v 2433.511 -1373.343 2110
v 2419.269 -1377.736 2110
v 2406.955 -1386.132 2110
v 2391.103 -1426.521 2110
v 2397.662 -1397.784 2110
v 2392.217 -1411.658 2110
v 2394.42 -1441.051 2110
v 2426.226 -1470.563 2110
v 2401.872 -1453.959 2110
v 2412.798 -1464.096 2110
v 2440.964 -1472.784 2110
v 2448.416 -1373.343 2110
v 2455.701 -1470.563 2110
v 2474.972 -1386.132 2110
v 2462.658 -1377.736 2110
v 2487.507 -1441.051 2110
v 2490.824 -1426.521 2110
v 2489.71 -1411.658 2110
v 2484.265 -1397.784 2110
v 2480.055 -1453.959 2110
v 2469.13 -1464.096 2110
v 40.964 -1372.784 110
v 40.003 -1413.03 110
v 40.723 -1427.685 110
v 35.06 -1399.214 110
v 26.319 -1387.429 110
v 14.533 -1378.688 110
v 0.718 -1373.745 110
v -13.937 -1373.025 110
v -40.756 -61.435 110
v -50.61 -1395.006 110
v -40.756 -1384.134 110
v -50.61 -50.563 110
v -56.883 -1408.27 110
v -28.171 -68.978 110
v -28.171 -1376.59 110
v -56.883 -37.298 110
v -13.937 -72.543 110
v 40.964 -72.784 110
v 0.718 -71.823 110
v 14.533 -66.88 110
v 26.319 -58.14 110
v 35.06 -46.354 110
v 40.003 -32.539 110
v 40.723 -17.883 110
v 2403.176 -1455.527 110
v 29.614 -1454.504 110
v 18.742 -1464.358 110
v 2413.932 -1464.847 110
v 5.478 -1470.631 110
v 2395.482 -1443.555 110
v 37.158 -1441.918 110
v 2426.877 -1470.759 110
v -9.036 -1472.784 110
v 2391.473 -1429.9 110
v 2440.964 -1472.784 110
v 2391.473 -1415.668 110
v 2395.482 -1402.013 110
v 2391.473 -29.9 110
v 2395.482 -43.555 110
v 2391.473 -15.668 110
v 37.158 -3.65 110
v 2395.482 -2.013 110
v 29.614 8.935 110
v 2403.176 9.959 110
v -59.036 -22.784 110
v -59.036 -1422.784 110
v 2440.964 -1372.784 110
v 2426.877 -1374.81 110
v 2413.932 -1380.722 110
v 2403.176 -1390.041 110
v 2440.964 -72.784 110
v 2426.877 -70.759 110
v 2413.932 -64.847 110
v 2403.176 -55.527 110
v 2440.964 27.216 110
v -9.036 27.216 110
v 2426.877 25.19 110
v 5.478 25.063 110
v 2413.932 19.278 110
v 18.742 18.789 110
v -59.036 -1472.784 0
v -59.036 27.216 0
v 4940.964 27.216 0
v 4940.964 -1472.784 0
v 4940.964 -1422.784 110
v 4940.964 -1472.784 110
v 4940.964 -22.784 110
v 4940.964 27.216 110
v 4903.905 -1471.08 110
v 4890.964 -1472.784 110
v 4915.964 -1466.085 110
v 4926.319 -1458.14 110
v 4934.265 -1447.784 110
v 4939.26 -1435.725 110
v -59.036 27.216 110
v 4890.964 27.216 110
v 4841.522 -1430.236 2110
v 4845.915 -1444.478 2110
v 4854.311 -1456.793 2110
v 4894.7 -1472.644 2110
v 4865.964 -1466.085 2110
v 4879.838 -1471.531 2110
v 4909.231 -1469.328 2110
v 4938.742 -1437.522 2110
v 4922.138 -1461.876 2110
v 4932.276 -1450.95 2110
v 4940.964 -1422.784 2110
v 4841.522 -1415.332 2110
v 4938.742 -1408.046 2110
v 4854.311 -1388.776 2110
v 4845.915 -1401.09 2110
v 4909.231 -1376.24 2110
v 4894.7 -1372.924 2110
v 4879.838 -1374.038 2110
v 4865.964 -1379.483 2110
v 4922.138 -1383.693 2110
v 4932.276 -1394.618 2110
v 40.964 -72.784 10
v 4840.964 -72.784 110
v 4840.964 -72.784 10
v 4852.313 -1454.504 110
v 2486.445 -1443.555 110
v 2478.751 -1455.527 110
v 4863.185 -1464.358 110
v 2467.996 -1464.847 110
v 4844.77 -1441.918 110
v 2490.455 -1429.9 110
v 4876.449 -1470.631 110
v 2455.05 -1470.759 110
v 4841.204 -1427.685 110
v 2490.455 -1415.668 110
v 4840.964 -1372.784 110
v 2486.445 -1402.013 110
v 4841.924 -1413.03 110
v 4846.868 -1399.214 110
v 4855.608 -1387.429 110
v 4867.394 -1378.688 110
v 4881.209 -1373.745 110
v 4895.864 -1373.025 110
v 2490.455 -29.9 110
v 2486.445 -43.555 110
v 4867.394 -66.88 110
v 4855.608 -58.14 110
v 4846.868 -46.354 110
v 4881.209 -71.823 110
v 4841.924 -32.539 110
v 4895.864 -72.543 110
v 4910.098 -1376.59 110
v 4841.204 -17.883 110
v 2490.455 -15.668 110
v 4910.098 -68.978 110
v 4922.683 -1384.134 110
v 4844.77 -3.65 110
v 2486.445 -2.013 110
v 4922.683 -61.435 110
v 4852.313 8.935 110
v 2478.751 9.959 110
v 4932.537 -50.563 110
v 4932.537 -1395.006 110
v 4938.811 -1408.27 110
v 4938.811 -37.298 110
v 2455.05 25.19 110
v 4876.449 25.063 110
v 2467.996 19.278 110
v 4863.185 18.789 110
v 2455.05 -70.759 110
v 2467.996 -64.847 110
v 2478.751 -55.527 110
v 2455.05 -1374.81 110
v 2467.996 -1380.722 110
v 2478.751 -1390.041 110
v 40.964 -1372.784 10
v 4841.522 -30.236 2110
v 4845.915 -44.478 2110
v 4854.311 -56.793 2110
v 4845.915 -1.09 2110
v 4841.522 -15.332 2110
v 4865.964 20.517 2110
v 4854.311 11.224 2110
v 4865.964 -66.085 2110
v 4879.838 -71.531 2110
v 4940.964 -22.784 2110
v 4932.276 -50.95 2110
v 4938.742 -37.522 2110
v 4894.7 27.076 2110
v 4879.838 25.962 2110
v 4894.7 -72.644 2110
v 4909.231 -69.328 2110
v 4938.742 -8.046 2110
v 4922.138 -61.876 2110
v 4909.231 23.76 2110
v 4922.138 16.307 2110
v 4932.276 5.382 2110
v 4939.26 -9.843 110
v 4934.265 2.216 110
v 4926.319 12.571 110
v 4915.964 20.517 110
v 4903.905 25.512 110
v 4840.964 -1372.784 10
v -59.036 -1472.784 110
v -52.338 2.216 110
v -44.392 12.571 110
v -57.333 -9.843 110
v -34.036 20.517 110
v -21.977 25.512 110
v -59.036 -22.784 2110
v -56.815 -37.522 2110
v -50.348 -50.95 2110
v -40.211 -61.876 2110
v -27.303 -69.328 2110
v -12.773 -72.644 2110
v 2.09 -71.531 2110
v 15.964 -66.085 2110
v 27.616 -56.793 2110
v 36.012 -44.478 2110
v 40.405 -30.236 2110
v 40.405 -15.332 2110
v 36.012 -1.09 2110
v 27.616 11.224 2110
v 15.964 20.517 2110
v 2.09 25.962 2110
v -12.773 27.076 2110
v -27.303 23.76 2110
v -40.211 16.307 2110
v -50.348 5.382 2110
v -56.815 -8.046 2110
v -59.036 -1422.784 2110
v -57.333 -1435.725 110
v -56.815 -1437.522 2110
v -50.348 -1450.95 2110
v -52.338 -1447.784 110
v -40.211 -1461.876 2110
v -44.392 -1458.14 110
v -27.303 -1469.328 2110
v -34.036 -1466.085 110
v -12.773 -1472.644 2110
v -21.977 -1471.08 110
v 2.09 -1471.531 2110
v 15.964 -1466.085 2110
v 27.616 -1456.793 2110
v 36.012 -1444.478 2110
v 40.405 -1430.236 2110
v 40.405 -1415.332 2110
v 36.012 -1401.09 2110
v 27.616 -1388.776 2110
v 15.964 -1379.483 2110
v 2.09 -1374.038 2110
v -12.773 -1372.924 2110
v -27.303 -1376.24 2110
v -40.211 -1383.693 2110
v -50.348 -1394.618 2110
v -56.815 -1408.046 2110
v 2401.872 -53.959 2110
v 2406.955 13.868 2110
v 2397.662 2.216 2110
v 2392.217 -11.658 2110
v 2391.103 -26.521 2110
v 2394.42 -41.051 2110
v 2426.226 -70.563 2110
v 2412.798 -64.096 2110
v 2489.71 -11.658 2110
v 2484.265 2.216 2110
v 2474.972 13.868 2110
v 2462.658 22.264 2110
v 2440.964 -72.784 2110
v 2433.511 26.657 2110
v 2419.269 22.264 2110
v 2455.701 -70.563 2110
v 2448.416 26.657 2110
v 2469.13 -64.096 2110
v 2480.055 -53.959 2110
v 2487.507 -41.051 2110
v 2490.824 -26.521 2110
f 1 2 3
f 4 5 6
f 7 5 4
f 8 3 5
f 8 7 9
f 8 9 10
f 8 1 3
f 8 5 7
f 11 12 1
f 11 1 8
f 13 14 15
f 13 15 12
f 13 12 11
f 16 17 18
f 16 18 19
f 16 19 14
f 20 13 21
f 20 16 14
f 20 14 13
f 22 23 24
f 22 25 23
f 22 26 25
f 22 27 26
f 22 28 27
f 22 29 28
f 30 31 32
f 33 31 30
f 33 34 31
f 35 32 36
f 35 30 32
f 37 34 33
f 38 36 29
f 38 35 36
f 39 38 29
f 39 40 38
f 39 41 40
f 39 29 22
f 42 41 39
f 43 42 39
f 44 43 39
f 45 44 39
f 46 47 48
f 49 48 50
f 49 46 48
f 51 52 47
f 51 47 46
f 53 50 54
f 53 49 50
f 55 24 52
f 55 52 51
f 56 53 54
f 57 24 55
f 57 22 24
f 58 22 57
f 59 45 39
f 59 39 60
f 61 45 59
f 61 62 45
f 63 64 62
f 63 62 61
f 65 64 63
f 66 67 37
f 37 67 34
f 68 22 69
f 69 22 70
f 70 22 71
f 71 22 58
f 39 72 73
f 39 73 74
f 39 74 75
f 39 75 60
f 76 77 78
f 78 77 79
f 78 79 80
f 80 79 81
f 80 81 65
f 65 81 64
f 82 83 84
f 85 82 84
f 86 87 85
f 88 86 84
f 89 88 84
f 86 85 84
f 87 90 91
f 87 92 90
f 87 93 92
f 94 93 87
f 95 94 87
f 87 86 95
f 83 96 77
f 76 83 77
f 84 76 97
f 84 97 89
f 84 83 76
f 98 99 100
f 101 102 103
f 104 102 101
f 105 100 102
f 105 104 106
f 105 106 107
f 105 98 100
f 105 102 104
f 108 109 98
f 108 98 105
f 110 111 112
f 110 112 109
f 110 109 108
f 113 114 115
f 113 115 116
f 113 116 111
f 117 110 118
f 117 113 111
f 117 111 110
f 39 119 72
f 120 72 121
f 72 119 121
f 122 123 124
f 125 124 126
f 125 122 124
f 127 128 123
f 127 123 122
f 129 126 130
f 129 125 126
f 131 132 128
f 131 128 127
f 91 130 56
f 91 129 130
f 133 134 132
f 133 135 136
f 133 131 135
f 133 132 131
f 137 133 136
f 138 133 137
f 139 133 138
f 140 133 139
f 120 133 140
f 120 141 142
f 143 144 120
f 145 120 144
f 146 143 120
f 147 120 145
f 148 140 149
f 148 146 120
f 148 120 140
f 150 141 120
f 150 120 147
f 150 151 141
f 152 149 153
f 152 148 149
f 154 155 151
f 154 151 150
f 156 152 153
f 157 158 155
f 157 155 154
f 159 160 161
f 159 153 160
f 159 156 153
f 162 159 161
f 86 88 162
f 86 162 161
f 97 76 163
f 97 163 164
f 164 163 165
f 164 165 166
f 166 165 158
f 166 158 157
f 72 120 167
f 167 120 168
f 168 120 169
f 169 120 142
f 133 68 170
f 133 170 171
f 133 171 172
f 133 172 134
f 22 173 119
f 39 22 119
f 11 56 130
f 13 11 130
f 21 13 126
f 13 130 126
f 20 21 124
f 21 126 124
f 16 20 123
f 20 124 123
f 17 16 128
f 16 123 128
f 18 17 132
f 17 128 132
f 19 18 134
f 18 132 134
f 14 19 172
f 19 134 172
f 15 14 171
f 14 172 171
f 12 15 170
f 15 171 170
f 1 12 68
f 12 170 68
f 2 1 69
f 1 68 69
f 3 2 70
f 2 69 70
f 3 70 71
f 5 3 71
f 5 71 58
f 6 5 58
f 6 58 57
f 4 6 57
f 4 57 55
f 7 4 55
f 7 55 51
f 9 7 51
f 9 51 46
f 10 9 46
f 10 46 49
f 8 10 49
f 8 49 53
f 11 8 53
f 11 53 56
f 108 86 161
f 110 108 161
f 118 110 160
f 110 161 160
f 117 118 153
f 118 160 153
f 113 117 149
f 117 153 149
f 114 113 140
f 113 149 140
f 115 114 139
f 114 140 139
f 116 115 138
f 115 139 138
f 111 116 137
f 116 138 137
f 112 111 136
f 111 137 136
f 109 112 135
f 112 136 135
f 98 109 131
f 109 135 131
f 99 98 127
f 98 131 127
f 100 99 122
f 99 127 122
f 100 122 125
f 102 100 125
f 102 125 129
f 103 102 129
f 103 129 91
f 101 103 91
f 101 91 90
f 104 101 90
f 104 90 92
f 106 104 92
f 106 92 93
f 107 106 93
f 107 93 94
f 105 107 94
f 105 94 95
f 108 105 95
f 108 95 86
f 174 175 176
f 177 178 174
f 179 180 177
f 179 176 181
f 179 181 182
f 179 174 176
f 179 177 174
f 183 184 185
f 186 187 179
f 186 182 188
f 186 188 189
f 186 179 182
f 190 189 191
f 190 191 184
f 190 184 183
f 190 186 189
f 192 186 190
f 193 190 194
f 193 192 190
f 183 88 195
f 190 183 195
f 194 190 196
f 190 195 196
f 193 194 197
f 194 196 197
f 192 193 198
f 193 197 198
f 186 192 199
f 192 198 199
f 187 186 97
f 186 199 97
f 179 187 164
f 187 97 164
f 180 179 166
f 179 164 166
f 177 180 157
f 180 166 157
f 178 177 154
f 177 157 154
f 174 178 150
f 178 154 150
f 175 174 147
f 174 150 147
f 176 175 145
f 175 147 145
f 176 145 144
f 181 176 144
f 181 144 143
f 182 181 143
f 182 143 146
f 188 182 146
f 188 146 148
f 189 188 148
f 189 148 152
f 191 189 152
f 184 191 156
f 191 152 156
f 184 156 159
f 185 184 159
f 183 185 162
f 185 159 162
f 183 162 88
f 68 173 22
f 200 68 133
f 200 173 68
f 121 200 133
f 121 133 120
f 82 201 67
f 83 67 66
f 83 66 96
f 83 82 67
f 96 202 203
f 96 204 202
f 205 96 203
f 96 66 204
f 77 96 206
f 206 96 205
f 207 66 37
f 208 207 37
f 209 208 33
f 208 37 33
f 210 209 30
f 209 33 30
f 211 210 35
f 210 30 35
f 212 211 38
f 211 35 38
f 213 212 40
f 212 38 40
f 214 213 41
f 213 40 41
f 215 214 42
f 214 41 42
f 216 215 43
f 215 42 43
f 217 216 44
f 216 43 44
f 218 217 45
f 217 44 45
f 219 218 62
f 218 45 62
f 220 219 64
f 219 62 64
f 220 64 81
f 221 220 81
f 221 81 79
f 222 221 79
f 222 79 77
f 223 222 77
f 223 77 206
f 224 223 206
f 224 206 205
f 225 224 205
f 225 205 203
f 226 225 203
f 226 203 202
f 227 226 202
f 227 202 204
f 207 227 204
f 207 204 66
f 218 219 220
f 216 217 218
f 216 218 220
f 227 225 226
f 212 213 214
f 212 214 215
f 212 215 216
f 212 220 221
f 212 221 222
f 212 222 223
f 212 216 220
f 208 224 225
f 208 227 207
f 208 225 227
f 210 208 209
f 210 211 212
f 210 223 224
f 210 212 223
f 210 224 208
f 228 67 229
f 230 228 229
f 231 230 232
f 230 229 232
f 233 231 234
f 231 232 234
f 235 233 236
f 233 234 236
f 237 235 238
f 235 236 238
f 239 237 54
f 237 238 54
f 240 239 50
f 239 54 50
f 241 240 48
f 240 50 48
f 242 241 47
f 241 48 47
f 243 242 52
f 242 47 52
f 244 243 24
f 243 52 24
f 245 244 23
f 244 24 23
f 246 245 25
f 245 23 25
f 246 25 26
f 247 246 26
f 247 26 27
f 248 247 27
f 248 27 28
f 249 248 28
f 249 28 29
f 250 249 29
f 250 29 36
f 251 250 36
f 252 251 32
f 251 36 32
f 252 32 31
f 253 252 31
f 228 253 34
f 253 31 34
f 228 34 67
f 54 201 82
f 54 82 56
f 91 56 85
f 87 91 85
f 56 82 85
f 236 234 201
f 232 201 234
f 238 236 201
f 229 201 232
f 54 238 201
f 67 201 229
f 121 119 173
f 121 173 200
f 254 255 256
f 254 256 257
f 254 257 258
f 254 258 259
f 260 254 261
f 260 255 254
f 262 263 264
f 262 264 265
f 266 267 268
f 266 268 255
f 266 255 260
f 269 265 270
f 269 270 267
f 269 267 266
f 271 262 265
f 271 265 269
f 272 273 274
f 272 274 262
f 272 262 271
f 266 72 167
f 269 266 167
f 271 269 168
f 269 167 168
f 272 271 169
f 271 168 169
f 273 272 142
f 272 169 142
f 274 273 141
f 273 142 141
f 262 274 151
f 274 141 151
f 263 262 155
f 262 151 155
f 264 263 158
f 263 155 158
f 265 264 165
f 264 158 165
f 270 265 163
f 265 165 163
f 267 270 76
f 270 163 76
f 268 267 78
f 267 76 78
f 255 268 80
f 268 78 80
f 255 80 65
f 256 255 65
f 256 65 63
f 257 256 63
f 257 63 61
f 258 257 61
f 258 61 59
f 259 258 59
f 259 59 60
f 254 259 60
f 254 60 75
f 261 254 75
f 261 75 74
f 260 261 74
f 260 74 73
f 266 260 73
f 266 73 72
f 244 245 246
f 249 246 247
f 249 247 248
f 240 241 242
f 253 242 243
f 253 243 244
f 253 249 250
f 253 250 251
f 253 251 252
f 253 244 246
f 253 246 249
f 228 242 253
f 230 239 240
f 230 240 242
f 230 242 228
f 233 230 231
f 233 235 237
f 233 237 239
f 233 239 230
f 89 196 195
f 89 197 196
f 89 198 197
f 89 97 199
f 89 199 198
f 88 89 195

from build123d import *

# Parameters (mm, degrees)
SKETCH_1_W      = 5000
SKETCH_1_H      = 1500
EXTRUDE_1_DEPTH = 10
SKETCH_2_W      = 5000
SKETCH_2_H      = 1500
SKETCH_2_W_2    = 4800
SKETCH_2_H_2    = 1300
EXTRUDE_2_DEPTH = 100
SKETCH_3_R      = 50
EXTRUDE_3_DEPTH = 2000
SKETCH_4_R      = 50
EXTRUDE_4_DEPTH = 2000


with BuildPart() as part:
    # 草图1 → 凸台-拉伸1 (new body)
    with BuildSketch(Plane.XY):
        with Locations((2440.963587986, -722.784179357)):
            Rectangle(SKETCH_1_W, SKETCH_1_H)
    extrude(amount=EXTRUDE_1_DEPTH)

    # 草图2 → 凸台-拉伸2 (add)
    with BuildSketch(Plane.XY.offset(10)):
        with Locations((2440.963587986, -722.784179357)):
            Rectangle(SKETCH_2_W, SKETCH_2_H)
        with Locations((2440.963587986, -722.784179357)):
            Rectangle(SKETCH_2_W_2, SKETCH_2_H_2, mode=Mode.SUBTRACT)
    extrude(amount=EXTRUDE_2_DEPTH)

    # 草图3 → 凸台-拉伸3 (add)
    with BuildSketch(Plane.XY.offset(110)):
        with Locations(Location((-9.036412014, -22.784179357, 0), (0, 0, 180))):
            Circle(SKETCH_3_R)
        with Locations(Location((-9.036412014, -1422.784179357, 0), (0, 0, 180))):
            Circle(SKETCH_3_R)
        with Locations((4890.963587986, -1422.784179357)):
            Circle(SKETCH_3_R)
        with Locations((4890.963587986, -22.784179357)):
            Circle(SKETCH_3_R)
    extrude(amount=EXTRUDE_3_DEPTH)

    # 草图4 → 凸台-拉伸4 (add)
    with BuildSketch(Plane.XY.offset(110)):
        with Locations(Location((2440.963587986, -22.784179357, 0), (0, 0, 270))):
            Circle(SKETCH_4_R)
        with Locations(Location((2440.963587986, -1422.784179357, 0), (0, 0, 270))):
            Circle(SKETCH_4_R)
    extrude(amount=EXTRUDE_4_DEPTH)


solid = part.part
